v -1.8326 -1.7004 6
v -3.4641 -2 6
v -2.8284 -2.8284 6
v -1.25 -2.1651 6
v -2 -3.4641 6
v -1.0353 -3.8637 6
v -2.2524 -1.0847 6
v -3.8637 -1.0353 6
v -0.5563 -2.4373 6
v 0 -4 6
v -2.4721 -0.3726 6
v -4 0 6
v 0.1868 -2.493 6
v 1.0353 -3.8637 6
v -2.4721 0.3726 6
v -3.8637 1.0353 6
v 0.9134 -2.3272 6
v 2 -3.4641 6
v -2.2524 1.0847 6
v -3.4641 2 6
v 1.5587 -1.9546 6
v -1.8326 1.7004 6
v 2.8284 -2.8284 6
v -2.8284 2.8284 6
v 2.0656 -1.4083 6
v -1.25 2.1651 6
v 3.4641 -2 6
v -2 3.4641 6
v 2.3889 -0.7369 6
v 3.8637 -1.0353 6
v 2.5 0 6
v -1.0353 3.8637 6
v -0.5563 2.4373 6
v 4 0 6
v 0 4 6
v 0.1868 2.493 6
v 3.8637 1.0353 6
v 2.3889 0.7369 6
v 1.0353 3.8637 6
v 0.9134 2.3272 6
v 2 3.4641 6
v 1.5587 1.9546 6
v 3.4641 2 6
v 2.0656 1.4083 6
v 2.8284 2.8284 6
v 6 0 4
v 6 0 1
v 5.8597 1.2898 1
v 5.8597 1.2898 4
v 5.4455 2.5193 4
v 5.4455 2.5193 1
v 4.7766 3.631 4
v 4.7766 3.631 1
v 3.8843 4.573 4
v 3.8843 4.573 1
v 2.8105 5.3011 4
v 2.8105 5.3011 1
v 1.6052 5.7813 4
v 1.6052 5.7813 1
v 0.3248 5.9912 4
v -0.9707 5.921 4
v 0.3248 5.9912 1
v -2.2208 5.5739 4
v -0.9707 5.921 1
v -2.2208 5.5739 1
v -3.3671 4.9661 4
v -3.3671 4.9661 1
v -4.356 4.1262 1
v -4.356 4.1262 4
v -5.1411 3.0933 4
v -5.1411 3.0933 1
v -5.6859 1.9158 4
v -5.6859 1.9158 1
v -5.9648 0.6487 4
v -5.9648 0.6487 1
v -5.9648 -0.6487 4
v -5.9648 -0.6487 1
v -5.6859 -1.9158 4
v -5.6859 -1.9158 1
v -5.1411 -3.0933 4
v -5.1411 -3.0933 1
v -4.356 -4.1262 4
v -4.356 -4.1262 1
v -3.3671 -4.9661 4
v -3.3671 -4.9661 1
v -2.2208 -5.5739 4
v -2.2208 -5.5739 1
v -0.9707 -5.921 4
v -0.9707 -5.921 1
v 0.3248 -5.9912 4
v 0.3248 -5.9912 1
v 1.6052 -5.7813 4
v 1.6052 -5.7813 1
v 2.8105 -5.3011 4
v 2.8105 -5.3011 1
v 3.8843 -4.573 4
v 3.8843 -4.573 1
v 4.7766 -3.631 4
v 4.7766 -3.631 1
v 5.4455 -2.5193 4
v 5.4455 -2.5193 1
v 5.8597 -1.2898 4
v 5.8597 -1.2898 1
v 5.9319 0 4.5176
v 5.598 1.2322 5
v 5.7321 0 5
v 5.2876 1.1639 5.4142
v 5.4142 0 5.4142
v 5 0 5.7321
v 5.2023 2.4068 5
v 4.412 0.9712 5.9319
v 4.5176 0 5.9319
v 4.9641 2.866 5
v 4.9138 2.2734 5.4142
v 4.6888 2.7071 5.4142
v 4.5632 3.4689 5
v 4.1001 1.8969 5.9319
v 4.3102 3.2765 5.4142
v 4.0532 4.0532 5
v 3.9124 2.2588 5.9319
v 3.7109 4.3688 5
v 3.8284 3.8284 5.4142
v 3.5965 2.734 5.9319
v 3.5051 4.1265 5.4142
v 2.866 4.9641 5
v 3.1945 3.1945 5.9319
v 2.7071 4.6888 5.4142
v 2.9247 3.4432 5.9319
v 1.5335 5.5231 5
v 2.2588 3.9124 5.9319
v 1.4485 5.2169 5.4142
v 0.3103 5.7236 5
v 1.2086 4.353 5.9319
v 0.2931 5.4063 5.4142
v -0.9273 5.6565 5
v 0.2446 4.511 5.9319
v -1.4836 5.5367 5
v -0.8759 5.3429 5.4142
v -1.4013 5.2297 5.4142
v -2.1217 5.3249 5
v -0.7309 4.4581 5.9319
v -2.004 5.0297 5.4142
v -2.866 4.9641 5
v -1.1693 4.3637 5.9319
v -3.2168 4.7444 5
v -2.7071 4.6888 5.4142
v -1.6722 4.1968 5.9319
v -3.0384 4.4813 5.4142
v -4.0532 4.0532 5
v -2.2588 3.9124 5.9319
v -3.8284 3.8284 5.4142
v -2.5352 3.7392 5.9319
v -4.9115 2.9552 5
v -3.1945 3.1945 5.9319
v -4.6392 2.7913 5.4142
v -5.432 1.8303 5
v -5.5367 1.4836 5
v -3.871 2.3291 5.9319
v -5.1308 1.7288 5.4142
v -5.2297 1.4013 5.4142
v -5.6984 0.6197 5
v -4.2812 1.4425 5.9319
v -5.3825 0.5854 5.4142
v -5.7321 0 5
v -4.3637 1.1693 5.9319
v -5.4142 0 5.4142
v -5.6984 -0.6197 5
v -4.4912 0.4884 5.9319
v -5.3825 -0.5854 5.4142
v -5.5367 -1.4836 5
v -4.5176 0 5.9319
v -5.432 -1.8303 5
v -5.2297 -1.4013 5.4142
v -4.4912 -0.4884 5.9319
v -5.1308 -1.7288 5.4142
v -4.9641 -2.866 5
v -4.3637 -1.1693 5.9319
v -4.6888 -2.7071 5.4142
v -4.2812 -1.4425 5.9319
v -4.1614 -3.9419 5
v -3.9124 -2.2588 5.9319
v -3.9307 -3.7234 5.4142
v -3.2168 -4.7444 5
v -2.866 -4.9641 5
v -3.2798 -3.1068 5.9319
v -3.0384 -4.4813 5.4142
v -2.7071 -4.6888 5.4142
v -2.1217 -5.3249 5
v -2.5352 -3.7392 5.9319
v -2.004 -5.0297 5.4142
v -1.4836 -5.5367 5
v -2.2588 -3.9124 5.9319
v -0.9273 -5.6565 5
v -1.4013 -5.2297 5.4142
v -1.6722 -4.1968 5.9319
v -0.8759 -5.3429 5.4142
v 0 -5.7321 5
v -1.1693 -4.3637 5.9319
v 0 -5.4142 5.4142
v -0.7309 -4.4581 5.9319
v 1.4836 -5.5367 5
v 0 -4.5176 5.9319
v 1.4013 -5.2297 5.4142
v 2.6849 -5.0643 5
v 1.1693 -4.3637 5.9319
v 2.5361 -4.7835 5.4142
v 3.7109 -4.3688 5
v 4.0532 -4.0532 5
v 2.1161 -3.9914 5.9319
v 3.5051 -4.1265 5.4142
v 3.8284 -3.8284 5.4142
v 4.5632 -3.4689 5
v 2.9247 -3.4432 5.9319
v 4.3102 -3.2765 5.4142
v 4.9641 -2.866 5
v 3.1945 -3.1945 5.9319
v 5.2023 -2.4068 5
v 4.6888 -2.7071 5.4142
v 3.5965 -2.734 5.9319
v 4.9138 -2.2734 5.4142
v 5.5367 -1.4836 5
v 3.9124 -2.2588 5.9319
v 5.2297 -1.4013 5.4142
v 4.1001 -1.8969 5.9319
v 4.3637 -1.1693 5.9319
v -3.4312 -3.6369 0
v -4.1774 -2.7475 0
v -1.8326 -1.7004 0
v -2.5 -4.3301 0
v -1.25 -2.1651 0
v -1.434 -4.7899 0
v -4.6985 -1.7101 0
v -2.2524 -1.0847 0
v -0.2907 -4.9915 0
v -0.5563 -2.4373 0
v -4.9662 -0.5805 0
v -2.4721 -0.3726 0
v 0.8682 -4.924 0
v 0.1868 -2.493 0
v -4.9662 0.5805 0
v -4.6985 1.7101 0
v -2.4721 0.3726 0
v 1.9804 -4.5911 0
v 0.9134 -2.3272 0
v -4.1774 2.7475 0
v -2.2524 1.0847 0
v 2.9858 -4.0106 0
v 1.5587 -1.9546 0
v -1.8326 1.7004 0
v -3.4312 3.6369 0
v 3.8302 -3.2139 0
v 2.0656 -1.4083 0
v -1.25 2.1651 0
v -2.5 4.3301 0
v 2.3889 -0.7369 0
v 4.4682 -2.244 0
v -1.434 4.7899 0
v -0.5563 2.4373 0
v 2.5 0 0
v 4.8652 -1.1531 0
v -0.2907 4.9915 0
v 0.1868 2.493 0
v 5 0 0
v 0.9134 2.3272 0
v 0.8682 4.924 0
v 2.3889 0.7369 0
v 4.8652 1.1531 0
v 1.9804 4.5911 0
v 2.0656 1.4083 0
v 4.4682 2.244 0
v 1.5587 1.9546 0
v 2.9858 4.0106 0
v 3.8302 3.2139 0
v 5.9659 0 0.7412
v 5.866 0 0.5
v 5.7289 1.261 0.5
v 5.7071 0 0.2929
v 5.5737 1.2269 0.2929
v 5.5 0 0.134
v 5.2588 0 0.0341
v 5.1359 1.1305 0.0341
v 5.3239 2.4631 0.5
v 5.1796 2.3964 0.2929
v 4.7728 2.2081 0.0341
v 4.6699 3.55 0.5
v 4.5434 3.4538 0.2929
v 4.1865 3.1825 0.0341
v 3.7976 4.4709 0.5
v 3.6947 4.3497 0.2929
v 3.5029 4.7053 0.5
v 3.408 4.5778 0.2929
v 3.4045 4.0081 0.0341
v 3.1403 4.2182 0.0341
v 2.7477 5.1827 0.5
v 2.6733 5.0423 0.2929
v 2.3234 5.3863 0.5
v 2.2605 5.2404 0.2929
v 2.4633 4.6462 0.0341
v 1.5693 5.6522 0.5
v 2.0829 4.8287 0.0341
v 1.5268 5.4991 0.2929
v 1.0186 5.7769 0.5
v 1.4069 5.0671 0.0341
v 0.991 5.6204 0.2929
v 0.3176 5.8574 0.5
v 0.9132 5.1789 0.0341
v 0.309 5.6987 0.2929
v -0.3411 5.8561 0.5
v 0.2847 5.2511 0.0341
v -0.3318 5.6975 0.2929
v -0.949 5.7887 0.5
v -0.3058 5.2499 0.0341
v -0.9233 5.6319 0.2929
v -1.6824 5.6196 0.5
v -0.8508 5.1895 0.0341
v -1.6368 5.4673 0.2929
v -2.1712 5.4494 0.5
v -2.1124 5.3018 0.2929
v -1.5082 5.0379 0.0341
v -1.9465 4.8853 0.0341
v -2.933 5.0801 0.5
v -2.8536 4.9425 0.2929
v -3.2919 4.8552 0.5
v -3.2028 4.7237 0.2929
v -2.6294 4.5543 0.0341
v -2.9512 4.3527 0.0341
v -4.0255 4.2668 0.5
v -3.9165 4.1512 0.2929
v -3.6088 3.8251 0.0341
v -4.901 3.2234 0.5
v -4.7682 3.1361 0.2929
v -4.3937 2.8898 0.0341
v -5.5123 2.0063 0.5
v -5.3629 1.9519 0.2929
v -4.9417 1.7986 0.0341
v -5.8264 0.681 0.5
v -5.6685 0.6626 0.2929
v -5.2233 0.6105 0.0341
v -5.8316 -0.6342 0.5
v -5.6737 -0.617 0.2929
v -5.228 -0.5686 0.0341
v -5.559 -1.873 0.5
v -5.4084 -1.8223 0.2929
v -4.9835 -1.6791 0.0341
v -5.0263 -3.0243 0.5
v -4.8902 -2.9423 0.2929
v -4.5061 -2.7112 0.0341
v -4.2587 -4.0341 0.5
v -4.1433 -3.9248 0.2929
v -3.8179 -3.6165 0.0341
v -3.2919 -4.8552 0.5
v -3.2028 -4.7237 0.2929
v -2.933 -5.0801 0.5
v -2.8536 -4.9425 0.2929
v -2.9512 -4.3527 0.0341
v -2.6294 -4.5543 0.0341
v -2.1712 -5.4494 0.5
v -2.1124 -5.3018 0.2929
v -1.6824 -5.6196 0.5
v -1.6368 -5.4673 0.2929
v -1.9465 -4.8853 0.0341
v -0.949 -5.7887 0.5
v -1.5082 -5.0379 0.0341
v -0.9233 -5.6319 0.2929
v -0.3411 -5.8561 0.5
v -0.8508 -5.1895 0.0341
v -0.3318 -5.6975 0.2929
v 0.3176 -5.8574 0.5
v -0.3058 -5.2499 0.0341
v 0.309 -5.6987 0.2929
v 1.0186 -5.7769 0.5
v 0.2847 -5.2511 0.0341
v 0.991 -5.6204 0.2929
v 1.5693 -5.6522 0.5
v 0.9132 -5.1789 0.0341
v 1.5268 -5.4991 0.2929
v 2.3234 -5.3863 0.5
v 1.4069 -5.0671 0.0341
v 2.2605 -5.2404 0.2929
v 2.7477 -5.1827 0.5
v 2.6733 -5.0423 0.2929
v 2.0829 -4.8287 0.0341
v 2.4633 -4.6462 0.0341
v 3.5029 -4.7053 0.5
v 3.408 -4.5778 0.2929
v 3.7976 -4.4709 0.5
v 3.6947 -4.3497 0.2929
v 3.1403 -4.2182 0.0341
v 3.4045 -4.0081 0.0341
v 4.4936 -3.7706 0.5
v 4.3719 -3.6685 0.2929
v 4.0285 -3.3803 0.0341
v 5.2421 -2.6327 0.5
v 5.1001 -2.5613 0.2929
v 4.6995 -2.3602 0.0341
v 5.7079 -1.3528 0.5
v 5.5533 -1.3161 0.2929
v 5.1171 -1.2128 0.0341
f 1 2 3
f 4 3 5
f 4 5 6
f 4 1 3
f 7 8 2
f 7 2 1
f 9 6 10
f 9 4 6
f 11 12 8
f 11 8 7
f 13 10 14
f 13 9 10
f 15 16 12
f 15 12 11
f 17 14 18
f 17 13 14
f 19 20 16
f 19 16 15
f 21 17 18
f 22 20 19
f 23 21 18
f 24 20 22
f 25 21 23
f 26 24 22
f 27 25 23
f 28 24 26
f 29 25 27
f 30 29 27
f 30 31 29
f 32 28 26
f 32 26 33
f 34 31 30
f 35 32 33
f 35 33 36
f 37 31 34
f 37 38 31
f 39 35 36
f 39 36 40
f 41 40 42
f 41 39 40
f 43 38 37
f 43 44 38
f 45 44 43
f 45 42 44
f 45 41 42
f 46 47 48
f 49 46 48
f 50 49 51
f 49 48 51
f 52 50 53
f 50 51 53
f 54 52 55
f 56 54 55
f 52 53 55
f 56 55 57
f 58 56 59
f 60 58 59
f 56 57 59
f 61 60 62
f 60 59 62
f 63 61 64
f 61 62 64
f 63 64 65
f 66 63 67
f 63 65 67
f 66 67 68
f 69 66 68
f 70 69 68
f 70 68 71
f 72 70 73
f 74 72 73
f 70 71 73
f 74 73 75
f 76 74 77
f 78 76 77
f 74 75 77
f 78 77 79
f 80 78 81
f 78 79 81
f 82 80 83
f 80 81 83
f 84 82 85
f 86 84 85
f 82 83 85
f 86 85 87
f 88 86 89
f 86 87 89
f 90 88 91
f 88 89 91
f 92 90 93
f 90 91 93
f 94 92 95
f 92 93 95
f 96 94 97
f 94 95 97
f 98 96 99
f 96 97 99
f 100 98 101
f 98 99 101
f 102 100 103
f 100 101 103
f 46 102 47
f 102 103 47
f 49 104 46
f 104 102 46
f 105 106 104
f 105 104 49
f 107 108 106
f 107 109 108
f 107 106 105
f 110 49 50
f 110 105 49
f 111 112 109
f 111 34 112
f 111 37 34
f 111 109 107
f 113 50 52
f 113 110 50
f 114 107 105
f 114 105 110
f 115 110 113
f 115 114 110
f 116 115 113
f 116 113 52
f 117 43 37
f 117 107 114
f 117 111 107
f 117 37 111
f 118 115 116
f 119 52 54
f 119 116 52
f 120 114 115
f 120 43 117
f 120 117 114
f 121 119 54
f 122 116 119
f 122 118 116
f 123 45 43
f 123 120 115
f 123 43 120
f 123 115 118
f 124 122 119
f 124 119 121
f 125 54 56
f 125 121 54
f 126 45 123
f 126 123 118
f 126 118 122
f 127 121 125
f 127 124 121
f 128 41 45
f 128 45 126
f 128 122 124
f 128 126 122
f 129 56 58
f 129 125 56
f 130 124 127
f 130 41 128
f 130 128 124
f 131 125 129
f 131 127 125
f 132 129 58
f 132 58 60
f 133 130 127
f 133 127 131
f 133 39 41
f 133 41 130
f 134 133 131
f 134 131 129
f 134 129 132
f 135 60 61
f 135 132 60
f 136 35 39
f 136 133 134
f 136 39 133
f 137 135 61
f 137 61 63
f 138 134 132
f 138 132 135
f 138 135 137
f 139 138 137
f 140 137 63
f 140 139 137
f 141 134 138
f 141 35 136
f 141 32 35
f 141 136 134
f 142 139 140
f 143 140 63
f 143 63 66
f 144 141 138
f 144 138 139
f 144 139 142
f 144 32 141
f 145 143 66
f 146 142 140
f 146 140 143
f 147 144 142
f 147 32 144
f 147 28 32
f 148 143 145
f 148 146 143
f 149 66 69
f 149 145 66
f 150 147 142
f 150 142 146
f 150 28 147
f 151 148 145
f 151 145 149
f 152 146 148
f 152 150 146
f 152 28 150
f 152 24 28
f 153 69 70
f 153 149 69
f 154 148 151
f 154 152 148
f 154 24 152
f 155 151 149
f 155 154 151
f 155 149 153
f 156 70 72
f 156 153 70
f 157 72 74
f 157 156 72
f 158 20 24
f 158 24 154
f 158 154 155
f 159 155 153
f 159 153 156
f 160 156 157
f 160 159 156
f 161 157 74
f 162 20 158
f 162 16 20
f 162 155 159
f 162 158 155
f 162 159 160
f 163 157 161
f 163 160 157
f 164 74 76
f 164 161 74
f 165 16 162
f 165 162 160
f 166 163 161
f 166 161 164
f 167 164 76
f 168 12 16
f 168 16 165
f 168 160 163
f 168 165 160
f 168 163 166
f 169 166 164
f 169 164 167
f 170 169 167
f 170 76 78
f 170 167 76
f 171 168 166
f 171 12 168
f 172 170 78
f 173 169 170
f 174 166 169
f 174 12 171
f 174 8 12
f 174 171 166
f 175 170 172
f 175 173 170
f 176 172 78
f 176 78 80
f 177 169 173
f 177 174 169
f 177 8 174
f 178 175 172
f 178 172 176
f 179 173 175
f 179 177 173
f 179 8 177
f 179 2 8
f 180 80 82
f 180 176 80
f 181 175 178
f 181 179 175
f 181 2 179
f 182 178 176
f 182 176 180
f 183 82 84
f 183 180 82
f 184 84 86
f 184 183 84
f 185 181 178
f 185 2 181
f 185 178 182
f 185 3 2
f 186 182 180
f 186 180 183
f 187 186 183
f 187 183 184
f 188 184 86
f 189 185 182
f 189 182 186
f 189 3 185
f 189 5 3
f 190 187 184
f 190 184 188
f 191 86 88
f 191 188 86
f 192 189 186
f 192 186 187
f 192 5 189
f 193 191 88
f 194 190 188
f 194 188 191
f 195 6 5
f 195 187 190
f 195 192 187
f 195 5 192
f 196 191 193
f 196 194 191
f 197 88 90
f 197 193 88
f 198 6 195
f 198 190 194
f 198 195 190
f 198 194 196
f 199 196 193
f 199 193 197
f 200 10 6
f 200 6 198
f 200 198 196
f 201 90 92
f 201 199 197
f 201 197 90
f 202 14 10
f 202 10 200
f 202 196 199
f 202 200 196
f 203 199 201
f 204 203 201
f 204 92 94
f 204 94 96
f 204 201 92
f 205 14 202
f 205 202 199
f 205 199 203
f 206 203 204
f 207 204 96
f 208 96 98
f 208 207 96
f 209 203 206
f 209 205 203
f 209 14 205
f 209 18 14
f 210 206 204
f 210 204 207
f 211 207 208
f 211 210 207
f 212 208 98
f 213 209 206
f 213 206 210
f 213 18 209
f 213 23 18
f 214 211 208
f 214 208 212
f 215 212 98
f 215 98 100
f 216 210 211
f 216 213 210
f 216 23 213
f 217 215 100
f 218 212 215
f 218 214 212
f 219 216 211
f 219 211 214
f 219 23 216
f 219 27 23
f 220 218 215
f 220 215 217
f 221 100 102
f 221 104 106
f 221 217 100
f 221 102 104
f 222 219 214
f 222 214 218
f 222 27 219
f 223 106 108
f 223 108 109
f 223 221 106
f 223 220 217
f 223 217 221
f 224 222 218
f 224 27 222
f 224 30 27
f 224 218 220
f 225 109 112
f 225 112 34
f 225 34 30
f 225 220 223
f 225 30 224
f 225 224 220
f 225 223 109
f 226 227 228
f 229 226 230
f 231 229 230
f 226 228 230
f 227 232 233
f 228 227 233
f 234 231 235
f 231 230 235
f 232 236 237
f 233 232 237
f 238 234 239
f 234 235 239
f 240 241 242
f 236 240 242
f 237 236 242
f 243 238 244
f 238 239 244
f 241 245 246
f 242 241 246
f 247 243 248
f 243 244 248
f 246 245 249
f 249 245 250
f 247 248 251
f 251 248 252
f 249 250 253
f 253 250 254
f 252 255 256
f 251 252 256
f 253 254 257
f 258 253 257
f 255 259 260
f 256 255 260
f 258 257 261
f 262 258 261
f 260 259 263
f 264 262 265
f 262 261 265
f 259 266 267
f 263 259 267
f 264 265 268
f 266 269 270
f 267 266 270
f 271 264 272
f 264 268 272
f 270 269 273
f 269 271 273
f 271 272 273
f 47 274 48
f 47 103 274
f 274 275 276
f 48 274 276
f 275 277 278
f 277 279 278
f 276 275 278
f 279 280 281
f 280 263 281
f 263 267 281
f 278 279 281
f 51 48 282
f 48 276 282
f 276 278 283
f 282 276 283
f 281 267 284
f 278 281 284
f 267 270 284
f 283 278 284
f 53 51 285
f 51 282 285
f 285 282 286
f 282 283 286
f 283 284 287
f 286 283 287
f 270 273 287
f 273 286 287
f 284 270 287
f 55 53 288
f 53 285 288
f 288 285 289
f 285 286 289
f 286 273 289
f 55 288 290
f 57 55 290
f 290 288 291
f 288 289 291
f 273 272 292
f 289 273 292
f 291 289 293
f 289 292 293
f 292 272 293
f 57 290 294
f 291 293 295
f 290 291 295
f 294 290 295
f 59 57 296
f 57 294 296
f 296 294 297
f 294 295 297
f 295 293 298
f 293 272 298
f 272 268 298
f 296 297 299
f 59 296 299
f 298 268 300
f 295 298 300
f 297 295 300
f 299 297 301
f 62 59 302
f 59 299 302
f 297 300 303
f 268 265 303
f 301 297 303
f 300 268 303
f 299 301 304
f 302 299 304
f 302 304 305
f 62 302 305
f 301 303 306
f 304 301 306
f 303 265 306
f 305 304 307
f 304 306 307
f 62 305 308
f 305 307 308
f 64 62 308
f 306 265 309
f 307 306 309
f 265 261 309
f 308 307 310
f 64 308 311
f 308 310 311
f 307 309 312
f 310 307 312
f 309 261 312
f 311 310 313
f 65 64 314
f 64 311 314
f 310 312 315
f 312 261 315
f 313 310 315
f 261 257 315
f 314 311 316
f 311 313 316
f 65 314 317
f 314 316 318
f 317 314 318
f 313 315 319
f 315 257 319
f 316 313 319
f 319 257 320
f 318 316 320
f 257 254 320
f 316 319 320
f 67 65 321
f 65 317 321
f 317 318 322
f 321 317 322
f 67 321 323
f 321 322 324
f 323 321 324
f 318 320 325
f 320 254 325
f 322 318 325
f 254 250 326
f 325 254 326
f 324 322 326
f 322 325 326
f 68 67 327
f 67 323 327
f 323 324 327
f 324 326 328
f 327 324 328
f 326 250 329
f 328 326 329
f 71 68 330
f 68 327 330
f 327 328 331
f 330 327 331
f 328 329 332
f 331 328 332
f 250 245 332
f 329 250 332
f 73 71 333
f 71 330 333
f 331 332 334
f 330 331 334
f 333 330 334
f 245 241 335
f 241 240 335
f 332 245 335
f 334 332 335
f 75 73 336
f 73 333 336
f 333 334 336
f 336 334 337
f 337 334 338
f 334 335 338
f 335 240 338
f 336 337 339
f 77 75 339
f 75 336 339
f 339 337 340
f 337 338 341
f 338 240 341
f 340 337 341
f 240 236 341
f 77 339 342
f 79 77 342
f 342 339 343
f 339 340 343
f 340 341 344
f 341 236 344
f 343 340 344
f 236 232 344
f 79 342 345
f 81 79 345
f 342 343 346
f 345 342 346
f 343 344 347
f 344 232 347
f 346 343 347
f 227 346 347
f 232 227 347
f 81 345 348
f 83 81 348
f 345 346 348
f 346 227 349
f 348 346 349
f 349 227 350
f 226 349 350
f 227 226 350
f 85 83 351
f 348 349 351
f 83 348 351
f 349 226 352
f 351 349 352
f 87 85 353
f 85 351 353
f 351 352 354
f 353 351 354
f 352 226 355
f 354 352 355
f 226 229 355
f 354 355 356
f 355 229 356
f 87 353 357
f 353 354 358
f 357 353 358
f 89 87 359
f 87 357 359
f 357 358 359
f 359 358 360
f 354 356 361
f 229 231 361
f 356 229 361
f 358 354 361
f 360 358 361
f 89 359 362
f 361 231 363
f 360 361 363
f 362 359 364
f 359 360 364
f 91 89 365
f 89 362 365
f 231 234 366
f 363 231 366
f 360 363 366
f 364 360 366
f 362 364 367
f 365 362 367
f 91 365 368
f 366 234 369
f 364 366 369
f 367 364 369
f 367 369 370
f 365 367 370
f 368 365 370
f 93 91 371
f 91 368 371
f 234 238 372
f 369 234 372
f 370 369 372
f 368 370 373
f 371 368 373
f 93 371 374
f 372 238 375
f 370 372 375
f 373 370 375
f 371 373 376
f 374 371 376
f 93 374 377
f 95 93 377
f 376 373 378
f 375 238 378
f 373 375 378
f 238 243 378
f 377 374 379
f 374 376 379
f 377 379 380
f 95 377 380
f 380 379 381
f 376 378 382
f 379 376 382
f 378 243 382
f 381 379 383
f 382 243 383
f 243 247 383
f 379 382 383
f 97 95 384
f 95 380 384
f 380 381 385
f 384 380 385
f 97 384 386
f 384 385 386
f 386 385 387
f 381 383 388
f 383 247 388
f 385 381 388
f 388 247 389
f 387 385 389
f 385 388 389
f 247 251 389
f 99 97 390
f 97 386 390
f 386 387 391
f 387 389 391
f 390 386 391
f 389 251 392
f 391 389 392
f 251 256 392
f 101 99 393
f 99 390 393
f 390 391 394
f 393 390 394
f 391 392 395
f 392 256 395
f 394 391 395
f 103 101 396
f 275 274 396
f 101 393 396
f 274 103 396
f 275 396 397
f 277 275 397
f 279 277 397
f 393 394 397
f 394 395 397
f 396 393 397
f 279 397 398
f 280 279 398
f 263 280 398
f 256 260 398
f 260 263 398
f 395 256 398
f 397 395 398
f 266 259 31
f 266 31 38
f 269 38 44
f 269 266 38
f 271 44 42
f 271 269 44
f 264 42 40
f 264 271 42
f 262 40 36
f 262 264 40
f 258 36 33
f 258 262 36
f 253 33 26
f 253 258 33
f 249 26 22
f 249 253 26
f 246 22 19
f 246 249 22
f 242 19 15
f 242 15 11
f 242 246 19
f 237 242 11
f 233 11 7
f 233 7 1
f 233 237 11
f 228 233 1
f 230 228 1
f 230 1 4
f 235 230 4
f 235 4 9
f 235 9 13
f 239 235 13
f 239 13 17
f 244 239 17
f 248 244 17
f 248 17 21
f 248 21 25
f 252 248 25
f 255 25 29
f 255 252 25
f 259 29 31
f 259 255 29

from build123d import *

# Parameters (mm, degrees)
F1_R     = 6
F1_R_2   = 2.5
F2_DEPTH = 6
F3_R     = 2
F4_R     = 1


with BuildPart() as f2:
    # F1 (on face) → F2 (new body)
    with BuildSketch(Plane.XY):
        Circle(F1_R)
        Circle(F1_R_2, mode=Mode.SUBTRACT)
    extrude(amount=F2_DEPTH)

    # F3
    f3_edges = [f2.edges().sort_by_distance(p)[0] for p in [
        (-6, 0, 6),
    ]]
    fillet(f3_edges, radius=F3_R)

    # F4
    f4_edges = [f2.edges().sort_by_distance(p)[0] for p in [
        (-6, 0, 0),
    ]]
    fillet(f4_edges, radius=F4_R)


solid = f2.part
